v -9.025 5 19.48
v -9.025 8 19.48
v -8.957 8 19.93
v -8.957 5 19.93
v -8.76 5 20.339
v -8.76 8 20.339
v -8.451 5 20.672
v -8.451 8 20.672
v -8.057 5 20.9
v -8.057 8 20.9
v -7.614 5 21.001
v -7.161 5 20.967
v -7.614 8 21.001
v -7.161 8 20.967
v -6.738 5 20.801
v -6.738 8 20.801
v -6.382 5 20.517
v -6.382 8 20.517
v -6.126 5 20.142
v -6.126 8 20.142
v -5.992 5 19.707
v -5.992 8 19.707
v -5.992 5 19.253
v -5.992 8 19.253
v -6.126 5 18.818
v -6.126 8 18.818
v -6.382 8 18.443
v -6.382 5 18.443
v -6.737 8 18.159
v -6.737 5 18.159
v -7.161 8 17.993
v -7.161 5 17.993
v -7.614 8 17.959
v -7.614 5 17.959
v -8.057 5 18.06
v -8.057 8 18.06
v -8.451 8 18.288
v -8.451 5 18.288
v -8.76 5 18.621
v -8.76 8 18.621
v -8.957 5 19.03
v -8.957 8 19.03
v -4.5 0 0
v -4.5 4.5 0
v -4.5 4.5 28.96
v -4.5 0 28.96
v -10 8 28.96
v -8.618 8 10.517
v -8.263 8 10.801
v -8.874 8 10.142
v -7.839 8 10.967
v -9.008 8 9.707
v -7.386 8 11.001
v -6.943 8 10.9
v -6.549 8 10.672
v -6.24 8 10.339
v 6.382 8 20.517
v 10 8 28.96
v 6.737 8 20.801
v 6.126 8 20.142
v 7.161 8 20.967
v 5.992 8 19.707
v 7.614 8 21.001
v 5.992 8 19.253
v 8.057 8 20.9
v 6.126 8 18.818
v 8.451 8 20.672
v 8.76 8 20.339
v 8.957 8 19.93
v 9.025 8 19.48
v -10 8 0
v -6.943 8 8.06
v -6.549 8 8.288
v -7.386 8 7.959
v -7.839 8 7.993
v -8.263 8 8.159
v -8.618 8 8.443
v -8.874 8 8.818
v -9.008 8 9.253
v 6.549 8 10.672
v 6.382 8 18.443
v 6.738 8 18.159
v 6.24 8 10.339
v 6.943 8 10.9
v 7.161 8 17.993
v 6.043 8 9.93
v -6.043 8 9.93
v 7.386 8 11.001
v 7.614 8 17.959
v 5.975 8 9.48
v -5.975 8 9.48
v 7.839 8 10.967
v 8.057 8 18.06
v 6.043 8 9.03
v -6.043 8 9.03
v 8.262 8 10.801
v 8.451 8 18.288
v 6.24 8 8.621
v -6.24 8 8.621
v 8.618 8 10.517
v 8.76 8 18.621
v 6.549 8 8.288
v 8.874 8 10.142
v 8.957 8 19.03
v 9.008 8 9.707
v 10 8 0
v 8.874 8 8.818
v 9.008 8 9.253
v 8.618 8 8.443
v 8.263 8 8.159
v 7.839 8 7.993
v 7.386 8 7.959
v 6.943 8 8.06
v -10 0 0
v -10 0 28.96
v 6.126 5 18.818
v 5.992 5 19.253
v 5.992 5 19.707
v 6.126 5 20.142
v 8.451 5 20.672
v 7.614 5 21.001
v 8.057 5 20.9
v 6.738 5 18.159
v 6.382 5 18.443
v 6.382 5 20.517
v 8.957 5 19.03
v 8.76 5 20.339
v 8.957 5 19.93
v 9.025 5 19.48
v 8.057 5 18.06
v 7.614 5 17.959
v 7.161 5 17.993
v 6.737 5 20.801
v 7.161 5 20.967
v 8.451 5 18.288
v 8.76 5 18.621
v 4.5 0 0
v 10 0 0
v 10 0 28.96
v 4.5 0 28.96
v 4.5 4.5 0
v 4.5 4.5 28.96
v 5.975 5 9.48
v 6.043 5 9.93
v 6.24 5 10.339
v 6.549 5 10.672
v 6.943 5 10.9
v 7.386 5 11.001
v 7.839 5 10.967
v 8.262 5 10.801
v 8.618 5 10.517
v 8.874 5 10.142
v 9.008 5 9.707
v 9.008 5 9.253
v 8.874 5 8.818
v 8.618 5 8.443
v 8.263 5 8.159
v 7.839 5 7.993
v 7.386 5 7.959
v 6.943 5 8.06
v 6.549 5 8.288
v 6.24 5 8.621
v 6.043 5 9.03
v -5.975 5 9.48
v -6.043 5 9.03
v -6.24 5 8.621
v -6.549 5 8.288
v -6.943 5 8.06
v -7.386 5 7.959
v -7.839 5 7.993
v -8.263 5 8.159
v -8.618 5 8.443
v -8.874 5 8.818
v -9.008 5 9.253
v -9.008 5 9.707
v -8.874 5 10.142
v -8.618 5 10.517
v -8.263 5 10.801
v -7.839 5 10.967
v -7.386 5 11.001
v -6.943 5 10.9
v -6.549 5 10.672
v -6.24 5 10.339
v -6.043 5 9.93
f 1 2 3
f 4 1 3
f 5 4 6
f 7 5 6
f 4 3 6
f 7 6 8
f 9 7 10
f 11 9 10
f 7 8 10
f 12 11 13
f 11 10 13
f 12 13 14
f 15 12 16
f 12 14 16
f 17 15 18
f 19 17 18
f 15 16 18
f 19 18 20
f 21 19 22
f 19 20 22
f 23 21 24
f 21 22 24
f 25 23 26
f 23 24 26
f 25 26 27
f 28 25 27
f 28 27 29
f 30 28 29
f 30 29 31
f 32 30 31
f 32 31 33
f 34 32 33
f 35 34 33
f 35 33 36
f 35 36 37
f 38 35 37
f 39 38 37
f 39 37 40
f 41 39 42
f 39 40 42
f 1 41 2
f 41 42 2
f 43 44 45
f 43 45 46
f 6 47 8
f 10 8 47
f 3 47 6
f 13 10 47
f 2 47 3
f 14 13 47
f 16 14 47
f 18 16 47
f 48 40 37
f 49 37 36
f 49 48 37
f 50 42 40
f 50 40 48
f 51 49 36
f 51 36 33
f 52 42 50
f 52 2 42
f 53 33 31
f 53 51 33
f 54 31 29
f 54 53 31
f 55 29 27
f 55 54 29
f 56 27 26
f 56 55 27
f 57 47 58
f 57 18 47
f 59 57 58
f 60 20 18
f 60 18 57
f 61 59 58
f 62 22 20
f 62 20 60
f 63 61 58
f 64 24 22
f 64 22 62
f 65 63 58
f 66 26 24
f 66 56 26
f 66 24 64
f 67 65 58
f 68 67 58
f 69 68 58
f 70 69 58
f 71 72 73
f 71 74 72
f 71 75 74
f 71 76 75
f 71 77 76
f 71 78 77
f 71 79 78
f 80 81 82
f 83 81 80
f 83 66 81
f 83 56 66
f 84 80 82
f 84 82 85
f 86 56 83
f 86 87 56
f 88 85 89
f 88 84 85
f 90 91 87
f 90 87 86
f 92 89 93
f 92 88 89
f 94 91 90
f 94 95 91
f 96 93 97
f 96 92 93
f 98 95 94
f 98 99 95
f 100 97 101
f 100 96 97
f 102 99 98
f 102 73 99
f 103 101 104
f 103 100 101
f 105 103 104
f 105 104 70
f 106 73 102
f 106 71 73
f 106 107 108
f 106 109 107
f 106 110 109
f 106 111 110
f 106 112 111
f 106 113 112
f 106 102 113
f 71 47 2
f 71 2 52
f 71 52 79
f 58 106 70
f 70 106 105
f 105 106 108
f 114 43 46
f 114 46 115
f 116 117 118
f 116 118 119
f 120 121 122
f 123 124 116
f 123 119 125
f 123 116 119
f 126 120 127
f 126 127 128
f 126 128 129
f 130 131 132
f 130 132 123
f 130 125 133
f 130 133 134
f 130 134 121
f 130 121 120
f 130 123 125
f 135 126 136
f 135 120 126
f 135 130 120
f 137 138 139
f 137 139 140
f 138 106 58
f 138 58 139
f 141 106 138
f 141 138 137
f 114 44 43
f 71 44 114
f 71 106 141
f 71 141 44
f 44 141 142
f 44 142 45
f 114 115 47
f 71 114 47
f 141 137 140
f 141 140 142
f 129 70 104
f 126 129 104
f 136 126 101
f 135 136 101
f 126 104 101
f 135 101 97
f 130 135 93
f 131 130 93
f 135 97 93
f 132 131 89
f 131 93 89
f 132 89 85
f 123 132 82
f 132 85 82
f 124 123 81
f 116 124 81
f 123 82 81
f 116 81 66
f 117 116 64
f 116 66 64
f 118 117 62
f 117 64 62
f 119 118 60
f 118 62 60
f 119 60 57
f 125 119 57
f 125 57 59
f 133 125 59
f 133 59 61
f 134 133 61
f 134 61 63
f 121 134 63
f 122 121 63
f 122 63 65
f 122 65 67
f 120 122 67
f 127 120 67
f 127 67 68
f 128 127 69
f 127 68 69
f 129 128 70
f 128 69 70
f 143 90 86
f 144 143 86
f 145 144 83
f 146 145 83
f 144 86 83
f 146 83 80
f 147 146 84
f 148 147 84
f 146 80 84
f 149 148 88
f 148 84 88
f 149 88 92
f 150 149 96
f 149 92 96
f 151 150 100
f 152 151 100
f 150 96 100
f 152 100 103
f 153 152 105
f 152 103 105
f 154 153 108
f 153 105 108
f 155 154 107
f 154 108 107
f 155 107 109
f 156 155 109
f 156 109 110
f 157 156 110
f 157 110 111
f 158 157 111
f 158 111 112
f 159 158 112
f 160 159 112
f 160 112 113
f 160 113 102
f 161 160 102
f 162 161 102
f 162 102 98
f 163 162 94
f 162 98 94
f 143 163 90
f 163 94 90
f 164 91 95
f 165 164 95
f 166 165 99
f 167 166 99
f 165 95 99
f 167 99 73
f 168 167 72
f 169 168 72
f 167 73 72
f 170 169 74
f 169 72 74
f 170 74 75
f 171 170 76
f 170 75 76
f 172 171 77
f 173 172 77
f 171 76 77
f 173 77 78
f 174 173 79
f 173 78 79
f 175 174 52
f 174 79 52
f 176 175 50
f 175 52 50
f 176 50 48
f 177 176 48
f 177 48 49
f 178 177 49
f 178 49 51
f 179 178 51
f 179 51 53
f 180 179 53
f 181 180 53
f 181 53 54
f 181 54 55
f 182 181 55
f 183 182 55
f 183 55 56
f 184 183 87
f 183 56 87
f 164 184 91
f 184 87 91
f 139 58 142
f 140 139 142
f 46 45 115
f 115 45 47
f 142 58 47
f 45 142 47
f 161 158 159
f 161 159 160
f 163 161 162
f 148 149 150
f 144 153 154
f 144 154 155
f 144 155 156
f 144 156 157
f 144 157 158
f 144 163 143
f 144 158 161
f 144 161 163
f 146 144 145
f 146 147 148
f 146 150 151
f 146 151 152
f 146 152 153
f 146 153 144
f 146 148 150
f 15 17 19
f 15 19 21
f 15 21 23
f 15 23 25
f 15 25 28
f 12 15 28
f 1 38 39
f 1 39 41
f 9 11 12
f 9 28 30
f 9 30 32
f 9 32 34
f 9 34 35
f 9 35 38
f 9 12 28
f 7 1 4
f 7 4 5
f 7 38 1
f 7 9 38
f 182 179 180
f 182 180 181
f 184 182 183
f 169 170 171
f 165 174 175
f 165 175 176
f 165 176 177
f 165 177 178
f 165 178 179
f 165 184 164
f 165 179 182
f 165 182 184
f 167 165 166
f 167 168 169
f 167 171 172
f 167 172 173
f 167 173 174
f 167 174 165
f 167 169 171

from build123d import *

# Parameters (mm, degrees)
EXTRUDE_1_DEPTH     = 28.96
SKETCH_2_R          = 1.525
CUT_EXTRUDE_1_DEPTH = 3


with BuildPart() as part:
    # 草图1 → 凸台-拉伸1 (new body)
    with BuildSketch(Plane.XY):
        Polygon((-10, 8), (10, 8), (10, 0), (4.5, 0), (4.5, 4.5), (-4.5, 4.5), (-4.5, 0), (-10, 0), align=None)
    extrude(amount=EXTRUDE_1_DEPTH)

    # 草图2 → 切除-拉伸1 (cut)
    with BuildSketch(Plane(origin=(0, 8, 0), x_dir=(1, 0, 0), z_dir=(0, 1, 0))):
        with Locations(Location((7.5, -9.48, 0), (0, 0, 180))):
            Circle(SKETCH_2_R)
        with Locations((7.5, -19.48)):
            Circle(SKETCH_2_R)
        with Locations(Location((-7.5, -19.48, 0), (0, 0, 180))):
            Circle(SKETCH_2_R)
        with Locations((-7.5, -9.48)):
            Circle(SKETCH_2_R)
    extrude(amount=-CUT_EXTRUDE_1_DEPTH, mode=Mode.SUBTRACT)


solid = part.part
